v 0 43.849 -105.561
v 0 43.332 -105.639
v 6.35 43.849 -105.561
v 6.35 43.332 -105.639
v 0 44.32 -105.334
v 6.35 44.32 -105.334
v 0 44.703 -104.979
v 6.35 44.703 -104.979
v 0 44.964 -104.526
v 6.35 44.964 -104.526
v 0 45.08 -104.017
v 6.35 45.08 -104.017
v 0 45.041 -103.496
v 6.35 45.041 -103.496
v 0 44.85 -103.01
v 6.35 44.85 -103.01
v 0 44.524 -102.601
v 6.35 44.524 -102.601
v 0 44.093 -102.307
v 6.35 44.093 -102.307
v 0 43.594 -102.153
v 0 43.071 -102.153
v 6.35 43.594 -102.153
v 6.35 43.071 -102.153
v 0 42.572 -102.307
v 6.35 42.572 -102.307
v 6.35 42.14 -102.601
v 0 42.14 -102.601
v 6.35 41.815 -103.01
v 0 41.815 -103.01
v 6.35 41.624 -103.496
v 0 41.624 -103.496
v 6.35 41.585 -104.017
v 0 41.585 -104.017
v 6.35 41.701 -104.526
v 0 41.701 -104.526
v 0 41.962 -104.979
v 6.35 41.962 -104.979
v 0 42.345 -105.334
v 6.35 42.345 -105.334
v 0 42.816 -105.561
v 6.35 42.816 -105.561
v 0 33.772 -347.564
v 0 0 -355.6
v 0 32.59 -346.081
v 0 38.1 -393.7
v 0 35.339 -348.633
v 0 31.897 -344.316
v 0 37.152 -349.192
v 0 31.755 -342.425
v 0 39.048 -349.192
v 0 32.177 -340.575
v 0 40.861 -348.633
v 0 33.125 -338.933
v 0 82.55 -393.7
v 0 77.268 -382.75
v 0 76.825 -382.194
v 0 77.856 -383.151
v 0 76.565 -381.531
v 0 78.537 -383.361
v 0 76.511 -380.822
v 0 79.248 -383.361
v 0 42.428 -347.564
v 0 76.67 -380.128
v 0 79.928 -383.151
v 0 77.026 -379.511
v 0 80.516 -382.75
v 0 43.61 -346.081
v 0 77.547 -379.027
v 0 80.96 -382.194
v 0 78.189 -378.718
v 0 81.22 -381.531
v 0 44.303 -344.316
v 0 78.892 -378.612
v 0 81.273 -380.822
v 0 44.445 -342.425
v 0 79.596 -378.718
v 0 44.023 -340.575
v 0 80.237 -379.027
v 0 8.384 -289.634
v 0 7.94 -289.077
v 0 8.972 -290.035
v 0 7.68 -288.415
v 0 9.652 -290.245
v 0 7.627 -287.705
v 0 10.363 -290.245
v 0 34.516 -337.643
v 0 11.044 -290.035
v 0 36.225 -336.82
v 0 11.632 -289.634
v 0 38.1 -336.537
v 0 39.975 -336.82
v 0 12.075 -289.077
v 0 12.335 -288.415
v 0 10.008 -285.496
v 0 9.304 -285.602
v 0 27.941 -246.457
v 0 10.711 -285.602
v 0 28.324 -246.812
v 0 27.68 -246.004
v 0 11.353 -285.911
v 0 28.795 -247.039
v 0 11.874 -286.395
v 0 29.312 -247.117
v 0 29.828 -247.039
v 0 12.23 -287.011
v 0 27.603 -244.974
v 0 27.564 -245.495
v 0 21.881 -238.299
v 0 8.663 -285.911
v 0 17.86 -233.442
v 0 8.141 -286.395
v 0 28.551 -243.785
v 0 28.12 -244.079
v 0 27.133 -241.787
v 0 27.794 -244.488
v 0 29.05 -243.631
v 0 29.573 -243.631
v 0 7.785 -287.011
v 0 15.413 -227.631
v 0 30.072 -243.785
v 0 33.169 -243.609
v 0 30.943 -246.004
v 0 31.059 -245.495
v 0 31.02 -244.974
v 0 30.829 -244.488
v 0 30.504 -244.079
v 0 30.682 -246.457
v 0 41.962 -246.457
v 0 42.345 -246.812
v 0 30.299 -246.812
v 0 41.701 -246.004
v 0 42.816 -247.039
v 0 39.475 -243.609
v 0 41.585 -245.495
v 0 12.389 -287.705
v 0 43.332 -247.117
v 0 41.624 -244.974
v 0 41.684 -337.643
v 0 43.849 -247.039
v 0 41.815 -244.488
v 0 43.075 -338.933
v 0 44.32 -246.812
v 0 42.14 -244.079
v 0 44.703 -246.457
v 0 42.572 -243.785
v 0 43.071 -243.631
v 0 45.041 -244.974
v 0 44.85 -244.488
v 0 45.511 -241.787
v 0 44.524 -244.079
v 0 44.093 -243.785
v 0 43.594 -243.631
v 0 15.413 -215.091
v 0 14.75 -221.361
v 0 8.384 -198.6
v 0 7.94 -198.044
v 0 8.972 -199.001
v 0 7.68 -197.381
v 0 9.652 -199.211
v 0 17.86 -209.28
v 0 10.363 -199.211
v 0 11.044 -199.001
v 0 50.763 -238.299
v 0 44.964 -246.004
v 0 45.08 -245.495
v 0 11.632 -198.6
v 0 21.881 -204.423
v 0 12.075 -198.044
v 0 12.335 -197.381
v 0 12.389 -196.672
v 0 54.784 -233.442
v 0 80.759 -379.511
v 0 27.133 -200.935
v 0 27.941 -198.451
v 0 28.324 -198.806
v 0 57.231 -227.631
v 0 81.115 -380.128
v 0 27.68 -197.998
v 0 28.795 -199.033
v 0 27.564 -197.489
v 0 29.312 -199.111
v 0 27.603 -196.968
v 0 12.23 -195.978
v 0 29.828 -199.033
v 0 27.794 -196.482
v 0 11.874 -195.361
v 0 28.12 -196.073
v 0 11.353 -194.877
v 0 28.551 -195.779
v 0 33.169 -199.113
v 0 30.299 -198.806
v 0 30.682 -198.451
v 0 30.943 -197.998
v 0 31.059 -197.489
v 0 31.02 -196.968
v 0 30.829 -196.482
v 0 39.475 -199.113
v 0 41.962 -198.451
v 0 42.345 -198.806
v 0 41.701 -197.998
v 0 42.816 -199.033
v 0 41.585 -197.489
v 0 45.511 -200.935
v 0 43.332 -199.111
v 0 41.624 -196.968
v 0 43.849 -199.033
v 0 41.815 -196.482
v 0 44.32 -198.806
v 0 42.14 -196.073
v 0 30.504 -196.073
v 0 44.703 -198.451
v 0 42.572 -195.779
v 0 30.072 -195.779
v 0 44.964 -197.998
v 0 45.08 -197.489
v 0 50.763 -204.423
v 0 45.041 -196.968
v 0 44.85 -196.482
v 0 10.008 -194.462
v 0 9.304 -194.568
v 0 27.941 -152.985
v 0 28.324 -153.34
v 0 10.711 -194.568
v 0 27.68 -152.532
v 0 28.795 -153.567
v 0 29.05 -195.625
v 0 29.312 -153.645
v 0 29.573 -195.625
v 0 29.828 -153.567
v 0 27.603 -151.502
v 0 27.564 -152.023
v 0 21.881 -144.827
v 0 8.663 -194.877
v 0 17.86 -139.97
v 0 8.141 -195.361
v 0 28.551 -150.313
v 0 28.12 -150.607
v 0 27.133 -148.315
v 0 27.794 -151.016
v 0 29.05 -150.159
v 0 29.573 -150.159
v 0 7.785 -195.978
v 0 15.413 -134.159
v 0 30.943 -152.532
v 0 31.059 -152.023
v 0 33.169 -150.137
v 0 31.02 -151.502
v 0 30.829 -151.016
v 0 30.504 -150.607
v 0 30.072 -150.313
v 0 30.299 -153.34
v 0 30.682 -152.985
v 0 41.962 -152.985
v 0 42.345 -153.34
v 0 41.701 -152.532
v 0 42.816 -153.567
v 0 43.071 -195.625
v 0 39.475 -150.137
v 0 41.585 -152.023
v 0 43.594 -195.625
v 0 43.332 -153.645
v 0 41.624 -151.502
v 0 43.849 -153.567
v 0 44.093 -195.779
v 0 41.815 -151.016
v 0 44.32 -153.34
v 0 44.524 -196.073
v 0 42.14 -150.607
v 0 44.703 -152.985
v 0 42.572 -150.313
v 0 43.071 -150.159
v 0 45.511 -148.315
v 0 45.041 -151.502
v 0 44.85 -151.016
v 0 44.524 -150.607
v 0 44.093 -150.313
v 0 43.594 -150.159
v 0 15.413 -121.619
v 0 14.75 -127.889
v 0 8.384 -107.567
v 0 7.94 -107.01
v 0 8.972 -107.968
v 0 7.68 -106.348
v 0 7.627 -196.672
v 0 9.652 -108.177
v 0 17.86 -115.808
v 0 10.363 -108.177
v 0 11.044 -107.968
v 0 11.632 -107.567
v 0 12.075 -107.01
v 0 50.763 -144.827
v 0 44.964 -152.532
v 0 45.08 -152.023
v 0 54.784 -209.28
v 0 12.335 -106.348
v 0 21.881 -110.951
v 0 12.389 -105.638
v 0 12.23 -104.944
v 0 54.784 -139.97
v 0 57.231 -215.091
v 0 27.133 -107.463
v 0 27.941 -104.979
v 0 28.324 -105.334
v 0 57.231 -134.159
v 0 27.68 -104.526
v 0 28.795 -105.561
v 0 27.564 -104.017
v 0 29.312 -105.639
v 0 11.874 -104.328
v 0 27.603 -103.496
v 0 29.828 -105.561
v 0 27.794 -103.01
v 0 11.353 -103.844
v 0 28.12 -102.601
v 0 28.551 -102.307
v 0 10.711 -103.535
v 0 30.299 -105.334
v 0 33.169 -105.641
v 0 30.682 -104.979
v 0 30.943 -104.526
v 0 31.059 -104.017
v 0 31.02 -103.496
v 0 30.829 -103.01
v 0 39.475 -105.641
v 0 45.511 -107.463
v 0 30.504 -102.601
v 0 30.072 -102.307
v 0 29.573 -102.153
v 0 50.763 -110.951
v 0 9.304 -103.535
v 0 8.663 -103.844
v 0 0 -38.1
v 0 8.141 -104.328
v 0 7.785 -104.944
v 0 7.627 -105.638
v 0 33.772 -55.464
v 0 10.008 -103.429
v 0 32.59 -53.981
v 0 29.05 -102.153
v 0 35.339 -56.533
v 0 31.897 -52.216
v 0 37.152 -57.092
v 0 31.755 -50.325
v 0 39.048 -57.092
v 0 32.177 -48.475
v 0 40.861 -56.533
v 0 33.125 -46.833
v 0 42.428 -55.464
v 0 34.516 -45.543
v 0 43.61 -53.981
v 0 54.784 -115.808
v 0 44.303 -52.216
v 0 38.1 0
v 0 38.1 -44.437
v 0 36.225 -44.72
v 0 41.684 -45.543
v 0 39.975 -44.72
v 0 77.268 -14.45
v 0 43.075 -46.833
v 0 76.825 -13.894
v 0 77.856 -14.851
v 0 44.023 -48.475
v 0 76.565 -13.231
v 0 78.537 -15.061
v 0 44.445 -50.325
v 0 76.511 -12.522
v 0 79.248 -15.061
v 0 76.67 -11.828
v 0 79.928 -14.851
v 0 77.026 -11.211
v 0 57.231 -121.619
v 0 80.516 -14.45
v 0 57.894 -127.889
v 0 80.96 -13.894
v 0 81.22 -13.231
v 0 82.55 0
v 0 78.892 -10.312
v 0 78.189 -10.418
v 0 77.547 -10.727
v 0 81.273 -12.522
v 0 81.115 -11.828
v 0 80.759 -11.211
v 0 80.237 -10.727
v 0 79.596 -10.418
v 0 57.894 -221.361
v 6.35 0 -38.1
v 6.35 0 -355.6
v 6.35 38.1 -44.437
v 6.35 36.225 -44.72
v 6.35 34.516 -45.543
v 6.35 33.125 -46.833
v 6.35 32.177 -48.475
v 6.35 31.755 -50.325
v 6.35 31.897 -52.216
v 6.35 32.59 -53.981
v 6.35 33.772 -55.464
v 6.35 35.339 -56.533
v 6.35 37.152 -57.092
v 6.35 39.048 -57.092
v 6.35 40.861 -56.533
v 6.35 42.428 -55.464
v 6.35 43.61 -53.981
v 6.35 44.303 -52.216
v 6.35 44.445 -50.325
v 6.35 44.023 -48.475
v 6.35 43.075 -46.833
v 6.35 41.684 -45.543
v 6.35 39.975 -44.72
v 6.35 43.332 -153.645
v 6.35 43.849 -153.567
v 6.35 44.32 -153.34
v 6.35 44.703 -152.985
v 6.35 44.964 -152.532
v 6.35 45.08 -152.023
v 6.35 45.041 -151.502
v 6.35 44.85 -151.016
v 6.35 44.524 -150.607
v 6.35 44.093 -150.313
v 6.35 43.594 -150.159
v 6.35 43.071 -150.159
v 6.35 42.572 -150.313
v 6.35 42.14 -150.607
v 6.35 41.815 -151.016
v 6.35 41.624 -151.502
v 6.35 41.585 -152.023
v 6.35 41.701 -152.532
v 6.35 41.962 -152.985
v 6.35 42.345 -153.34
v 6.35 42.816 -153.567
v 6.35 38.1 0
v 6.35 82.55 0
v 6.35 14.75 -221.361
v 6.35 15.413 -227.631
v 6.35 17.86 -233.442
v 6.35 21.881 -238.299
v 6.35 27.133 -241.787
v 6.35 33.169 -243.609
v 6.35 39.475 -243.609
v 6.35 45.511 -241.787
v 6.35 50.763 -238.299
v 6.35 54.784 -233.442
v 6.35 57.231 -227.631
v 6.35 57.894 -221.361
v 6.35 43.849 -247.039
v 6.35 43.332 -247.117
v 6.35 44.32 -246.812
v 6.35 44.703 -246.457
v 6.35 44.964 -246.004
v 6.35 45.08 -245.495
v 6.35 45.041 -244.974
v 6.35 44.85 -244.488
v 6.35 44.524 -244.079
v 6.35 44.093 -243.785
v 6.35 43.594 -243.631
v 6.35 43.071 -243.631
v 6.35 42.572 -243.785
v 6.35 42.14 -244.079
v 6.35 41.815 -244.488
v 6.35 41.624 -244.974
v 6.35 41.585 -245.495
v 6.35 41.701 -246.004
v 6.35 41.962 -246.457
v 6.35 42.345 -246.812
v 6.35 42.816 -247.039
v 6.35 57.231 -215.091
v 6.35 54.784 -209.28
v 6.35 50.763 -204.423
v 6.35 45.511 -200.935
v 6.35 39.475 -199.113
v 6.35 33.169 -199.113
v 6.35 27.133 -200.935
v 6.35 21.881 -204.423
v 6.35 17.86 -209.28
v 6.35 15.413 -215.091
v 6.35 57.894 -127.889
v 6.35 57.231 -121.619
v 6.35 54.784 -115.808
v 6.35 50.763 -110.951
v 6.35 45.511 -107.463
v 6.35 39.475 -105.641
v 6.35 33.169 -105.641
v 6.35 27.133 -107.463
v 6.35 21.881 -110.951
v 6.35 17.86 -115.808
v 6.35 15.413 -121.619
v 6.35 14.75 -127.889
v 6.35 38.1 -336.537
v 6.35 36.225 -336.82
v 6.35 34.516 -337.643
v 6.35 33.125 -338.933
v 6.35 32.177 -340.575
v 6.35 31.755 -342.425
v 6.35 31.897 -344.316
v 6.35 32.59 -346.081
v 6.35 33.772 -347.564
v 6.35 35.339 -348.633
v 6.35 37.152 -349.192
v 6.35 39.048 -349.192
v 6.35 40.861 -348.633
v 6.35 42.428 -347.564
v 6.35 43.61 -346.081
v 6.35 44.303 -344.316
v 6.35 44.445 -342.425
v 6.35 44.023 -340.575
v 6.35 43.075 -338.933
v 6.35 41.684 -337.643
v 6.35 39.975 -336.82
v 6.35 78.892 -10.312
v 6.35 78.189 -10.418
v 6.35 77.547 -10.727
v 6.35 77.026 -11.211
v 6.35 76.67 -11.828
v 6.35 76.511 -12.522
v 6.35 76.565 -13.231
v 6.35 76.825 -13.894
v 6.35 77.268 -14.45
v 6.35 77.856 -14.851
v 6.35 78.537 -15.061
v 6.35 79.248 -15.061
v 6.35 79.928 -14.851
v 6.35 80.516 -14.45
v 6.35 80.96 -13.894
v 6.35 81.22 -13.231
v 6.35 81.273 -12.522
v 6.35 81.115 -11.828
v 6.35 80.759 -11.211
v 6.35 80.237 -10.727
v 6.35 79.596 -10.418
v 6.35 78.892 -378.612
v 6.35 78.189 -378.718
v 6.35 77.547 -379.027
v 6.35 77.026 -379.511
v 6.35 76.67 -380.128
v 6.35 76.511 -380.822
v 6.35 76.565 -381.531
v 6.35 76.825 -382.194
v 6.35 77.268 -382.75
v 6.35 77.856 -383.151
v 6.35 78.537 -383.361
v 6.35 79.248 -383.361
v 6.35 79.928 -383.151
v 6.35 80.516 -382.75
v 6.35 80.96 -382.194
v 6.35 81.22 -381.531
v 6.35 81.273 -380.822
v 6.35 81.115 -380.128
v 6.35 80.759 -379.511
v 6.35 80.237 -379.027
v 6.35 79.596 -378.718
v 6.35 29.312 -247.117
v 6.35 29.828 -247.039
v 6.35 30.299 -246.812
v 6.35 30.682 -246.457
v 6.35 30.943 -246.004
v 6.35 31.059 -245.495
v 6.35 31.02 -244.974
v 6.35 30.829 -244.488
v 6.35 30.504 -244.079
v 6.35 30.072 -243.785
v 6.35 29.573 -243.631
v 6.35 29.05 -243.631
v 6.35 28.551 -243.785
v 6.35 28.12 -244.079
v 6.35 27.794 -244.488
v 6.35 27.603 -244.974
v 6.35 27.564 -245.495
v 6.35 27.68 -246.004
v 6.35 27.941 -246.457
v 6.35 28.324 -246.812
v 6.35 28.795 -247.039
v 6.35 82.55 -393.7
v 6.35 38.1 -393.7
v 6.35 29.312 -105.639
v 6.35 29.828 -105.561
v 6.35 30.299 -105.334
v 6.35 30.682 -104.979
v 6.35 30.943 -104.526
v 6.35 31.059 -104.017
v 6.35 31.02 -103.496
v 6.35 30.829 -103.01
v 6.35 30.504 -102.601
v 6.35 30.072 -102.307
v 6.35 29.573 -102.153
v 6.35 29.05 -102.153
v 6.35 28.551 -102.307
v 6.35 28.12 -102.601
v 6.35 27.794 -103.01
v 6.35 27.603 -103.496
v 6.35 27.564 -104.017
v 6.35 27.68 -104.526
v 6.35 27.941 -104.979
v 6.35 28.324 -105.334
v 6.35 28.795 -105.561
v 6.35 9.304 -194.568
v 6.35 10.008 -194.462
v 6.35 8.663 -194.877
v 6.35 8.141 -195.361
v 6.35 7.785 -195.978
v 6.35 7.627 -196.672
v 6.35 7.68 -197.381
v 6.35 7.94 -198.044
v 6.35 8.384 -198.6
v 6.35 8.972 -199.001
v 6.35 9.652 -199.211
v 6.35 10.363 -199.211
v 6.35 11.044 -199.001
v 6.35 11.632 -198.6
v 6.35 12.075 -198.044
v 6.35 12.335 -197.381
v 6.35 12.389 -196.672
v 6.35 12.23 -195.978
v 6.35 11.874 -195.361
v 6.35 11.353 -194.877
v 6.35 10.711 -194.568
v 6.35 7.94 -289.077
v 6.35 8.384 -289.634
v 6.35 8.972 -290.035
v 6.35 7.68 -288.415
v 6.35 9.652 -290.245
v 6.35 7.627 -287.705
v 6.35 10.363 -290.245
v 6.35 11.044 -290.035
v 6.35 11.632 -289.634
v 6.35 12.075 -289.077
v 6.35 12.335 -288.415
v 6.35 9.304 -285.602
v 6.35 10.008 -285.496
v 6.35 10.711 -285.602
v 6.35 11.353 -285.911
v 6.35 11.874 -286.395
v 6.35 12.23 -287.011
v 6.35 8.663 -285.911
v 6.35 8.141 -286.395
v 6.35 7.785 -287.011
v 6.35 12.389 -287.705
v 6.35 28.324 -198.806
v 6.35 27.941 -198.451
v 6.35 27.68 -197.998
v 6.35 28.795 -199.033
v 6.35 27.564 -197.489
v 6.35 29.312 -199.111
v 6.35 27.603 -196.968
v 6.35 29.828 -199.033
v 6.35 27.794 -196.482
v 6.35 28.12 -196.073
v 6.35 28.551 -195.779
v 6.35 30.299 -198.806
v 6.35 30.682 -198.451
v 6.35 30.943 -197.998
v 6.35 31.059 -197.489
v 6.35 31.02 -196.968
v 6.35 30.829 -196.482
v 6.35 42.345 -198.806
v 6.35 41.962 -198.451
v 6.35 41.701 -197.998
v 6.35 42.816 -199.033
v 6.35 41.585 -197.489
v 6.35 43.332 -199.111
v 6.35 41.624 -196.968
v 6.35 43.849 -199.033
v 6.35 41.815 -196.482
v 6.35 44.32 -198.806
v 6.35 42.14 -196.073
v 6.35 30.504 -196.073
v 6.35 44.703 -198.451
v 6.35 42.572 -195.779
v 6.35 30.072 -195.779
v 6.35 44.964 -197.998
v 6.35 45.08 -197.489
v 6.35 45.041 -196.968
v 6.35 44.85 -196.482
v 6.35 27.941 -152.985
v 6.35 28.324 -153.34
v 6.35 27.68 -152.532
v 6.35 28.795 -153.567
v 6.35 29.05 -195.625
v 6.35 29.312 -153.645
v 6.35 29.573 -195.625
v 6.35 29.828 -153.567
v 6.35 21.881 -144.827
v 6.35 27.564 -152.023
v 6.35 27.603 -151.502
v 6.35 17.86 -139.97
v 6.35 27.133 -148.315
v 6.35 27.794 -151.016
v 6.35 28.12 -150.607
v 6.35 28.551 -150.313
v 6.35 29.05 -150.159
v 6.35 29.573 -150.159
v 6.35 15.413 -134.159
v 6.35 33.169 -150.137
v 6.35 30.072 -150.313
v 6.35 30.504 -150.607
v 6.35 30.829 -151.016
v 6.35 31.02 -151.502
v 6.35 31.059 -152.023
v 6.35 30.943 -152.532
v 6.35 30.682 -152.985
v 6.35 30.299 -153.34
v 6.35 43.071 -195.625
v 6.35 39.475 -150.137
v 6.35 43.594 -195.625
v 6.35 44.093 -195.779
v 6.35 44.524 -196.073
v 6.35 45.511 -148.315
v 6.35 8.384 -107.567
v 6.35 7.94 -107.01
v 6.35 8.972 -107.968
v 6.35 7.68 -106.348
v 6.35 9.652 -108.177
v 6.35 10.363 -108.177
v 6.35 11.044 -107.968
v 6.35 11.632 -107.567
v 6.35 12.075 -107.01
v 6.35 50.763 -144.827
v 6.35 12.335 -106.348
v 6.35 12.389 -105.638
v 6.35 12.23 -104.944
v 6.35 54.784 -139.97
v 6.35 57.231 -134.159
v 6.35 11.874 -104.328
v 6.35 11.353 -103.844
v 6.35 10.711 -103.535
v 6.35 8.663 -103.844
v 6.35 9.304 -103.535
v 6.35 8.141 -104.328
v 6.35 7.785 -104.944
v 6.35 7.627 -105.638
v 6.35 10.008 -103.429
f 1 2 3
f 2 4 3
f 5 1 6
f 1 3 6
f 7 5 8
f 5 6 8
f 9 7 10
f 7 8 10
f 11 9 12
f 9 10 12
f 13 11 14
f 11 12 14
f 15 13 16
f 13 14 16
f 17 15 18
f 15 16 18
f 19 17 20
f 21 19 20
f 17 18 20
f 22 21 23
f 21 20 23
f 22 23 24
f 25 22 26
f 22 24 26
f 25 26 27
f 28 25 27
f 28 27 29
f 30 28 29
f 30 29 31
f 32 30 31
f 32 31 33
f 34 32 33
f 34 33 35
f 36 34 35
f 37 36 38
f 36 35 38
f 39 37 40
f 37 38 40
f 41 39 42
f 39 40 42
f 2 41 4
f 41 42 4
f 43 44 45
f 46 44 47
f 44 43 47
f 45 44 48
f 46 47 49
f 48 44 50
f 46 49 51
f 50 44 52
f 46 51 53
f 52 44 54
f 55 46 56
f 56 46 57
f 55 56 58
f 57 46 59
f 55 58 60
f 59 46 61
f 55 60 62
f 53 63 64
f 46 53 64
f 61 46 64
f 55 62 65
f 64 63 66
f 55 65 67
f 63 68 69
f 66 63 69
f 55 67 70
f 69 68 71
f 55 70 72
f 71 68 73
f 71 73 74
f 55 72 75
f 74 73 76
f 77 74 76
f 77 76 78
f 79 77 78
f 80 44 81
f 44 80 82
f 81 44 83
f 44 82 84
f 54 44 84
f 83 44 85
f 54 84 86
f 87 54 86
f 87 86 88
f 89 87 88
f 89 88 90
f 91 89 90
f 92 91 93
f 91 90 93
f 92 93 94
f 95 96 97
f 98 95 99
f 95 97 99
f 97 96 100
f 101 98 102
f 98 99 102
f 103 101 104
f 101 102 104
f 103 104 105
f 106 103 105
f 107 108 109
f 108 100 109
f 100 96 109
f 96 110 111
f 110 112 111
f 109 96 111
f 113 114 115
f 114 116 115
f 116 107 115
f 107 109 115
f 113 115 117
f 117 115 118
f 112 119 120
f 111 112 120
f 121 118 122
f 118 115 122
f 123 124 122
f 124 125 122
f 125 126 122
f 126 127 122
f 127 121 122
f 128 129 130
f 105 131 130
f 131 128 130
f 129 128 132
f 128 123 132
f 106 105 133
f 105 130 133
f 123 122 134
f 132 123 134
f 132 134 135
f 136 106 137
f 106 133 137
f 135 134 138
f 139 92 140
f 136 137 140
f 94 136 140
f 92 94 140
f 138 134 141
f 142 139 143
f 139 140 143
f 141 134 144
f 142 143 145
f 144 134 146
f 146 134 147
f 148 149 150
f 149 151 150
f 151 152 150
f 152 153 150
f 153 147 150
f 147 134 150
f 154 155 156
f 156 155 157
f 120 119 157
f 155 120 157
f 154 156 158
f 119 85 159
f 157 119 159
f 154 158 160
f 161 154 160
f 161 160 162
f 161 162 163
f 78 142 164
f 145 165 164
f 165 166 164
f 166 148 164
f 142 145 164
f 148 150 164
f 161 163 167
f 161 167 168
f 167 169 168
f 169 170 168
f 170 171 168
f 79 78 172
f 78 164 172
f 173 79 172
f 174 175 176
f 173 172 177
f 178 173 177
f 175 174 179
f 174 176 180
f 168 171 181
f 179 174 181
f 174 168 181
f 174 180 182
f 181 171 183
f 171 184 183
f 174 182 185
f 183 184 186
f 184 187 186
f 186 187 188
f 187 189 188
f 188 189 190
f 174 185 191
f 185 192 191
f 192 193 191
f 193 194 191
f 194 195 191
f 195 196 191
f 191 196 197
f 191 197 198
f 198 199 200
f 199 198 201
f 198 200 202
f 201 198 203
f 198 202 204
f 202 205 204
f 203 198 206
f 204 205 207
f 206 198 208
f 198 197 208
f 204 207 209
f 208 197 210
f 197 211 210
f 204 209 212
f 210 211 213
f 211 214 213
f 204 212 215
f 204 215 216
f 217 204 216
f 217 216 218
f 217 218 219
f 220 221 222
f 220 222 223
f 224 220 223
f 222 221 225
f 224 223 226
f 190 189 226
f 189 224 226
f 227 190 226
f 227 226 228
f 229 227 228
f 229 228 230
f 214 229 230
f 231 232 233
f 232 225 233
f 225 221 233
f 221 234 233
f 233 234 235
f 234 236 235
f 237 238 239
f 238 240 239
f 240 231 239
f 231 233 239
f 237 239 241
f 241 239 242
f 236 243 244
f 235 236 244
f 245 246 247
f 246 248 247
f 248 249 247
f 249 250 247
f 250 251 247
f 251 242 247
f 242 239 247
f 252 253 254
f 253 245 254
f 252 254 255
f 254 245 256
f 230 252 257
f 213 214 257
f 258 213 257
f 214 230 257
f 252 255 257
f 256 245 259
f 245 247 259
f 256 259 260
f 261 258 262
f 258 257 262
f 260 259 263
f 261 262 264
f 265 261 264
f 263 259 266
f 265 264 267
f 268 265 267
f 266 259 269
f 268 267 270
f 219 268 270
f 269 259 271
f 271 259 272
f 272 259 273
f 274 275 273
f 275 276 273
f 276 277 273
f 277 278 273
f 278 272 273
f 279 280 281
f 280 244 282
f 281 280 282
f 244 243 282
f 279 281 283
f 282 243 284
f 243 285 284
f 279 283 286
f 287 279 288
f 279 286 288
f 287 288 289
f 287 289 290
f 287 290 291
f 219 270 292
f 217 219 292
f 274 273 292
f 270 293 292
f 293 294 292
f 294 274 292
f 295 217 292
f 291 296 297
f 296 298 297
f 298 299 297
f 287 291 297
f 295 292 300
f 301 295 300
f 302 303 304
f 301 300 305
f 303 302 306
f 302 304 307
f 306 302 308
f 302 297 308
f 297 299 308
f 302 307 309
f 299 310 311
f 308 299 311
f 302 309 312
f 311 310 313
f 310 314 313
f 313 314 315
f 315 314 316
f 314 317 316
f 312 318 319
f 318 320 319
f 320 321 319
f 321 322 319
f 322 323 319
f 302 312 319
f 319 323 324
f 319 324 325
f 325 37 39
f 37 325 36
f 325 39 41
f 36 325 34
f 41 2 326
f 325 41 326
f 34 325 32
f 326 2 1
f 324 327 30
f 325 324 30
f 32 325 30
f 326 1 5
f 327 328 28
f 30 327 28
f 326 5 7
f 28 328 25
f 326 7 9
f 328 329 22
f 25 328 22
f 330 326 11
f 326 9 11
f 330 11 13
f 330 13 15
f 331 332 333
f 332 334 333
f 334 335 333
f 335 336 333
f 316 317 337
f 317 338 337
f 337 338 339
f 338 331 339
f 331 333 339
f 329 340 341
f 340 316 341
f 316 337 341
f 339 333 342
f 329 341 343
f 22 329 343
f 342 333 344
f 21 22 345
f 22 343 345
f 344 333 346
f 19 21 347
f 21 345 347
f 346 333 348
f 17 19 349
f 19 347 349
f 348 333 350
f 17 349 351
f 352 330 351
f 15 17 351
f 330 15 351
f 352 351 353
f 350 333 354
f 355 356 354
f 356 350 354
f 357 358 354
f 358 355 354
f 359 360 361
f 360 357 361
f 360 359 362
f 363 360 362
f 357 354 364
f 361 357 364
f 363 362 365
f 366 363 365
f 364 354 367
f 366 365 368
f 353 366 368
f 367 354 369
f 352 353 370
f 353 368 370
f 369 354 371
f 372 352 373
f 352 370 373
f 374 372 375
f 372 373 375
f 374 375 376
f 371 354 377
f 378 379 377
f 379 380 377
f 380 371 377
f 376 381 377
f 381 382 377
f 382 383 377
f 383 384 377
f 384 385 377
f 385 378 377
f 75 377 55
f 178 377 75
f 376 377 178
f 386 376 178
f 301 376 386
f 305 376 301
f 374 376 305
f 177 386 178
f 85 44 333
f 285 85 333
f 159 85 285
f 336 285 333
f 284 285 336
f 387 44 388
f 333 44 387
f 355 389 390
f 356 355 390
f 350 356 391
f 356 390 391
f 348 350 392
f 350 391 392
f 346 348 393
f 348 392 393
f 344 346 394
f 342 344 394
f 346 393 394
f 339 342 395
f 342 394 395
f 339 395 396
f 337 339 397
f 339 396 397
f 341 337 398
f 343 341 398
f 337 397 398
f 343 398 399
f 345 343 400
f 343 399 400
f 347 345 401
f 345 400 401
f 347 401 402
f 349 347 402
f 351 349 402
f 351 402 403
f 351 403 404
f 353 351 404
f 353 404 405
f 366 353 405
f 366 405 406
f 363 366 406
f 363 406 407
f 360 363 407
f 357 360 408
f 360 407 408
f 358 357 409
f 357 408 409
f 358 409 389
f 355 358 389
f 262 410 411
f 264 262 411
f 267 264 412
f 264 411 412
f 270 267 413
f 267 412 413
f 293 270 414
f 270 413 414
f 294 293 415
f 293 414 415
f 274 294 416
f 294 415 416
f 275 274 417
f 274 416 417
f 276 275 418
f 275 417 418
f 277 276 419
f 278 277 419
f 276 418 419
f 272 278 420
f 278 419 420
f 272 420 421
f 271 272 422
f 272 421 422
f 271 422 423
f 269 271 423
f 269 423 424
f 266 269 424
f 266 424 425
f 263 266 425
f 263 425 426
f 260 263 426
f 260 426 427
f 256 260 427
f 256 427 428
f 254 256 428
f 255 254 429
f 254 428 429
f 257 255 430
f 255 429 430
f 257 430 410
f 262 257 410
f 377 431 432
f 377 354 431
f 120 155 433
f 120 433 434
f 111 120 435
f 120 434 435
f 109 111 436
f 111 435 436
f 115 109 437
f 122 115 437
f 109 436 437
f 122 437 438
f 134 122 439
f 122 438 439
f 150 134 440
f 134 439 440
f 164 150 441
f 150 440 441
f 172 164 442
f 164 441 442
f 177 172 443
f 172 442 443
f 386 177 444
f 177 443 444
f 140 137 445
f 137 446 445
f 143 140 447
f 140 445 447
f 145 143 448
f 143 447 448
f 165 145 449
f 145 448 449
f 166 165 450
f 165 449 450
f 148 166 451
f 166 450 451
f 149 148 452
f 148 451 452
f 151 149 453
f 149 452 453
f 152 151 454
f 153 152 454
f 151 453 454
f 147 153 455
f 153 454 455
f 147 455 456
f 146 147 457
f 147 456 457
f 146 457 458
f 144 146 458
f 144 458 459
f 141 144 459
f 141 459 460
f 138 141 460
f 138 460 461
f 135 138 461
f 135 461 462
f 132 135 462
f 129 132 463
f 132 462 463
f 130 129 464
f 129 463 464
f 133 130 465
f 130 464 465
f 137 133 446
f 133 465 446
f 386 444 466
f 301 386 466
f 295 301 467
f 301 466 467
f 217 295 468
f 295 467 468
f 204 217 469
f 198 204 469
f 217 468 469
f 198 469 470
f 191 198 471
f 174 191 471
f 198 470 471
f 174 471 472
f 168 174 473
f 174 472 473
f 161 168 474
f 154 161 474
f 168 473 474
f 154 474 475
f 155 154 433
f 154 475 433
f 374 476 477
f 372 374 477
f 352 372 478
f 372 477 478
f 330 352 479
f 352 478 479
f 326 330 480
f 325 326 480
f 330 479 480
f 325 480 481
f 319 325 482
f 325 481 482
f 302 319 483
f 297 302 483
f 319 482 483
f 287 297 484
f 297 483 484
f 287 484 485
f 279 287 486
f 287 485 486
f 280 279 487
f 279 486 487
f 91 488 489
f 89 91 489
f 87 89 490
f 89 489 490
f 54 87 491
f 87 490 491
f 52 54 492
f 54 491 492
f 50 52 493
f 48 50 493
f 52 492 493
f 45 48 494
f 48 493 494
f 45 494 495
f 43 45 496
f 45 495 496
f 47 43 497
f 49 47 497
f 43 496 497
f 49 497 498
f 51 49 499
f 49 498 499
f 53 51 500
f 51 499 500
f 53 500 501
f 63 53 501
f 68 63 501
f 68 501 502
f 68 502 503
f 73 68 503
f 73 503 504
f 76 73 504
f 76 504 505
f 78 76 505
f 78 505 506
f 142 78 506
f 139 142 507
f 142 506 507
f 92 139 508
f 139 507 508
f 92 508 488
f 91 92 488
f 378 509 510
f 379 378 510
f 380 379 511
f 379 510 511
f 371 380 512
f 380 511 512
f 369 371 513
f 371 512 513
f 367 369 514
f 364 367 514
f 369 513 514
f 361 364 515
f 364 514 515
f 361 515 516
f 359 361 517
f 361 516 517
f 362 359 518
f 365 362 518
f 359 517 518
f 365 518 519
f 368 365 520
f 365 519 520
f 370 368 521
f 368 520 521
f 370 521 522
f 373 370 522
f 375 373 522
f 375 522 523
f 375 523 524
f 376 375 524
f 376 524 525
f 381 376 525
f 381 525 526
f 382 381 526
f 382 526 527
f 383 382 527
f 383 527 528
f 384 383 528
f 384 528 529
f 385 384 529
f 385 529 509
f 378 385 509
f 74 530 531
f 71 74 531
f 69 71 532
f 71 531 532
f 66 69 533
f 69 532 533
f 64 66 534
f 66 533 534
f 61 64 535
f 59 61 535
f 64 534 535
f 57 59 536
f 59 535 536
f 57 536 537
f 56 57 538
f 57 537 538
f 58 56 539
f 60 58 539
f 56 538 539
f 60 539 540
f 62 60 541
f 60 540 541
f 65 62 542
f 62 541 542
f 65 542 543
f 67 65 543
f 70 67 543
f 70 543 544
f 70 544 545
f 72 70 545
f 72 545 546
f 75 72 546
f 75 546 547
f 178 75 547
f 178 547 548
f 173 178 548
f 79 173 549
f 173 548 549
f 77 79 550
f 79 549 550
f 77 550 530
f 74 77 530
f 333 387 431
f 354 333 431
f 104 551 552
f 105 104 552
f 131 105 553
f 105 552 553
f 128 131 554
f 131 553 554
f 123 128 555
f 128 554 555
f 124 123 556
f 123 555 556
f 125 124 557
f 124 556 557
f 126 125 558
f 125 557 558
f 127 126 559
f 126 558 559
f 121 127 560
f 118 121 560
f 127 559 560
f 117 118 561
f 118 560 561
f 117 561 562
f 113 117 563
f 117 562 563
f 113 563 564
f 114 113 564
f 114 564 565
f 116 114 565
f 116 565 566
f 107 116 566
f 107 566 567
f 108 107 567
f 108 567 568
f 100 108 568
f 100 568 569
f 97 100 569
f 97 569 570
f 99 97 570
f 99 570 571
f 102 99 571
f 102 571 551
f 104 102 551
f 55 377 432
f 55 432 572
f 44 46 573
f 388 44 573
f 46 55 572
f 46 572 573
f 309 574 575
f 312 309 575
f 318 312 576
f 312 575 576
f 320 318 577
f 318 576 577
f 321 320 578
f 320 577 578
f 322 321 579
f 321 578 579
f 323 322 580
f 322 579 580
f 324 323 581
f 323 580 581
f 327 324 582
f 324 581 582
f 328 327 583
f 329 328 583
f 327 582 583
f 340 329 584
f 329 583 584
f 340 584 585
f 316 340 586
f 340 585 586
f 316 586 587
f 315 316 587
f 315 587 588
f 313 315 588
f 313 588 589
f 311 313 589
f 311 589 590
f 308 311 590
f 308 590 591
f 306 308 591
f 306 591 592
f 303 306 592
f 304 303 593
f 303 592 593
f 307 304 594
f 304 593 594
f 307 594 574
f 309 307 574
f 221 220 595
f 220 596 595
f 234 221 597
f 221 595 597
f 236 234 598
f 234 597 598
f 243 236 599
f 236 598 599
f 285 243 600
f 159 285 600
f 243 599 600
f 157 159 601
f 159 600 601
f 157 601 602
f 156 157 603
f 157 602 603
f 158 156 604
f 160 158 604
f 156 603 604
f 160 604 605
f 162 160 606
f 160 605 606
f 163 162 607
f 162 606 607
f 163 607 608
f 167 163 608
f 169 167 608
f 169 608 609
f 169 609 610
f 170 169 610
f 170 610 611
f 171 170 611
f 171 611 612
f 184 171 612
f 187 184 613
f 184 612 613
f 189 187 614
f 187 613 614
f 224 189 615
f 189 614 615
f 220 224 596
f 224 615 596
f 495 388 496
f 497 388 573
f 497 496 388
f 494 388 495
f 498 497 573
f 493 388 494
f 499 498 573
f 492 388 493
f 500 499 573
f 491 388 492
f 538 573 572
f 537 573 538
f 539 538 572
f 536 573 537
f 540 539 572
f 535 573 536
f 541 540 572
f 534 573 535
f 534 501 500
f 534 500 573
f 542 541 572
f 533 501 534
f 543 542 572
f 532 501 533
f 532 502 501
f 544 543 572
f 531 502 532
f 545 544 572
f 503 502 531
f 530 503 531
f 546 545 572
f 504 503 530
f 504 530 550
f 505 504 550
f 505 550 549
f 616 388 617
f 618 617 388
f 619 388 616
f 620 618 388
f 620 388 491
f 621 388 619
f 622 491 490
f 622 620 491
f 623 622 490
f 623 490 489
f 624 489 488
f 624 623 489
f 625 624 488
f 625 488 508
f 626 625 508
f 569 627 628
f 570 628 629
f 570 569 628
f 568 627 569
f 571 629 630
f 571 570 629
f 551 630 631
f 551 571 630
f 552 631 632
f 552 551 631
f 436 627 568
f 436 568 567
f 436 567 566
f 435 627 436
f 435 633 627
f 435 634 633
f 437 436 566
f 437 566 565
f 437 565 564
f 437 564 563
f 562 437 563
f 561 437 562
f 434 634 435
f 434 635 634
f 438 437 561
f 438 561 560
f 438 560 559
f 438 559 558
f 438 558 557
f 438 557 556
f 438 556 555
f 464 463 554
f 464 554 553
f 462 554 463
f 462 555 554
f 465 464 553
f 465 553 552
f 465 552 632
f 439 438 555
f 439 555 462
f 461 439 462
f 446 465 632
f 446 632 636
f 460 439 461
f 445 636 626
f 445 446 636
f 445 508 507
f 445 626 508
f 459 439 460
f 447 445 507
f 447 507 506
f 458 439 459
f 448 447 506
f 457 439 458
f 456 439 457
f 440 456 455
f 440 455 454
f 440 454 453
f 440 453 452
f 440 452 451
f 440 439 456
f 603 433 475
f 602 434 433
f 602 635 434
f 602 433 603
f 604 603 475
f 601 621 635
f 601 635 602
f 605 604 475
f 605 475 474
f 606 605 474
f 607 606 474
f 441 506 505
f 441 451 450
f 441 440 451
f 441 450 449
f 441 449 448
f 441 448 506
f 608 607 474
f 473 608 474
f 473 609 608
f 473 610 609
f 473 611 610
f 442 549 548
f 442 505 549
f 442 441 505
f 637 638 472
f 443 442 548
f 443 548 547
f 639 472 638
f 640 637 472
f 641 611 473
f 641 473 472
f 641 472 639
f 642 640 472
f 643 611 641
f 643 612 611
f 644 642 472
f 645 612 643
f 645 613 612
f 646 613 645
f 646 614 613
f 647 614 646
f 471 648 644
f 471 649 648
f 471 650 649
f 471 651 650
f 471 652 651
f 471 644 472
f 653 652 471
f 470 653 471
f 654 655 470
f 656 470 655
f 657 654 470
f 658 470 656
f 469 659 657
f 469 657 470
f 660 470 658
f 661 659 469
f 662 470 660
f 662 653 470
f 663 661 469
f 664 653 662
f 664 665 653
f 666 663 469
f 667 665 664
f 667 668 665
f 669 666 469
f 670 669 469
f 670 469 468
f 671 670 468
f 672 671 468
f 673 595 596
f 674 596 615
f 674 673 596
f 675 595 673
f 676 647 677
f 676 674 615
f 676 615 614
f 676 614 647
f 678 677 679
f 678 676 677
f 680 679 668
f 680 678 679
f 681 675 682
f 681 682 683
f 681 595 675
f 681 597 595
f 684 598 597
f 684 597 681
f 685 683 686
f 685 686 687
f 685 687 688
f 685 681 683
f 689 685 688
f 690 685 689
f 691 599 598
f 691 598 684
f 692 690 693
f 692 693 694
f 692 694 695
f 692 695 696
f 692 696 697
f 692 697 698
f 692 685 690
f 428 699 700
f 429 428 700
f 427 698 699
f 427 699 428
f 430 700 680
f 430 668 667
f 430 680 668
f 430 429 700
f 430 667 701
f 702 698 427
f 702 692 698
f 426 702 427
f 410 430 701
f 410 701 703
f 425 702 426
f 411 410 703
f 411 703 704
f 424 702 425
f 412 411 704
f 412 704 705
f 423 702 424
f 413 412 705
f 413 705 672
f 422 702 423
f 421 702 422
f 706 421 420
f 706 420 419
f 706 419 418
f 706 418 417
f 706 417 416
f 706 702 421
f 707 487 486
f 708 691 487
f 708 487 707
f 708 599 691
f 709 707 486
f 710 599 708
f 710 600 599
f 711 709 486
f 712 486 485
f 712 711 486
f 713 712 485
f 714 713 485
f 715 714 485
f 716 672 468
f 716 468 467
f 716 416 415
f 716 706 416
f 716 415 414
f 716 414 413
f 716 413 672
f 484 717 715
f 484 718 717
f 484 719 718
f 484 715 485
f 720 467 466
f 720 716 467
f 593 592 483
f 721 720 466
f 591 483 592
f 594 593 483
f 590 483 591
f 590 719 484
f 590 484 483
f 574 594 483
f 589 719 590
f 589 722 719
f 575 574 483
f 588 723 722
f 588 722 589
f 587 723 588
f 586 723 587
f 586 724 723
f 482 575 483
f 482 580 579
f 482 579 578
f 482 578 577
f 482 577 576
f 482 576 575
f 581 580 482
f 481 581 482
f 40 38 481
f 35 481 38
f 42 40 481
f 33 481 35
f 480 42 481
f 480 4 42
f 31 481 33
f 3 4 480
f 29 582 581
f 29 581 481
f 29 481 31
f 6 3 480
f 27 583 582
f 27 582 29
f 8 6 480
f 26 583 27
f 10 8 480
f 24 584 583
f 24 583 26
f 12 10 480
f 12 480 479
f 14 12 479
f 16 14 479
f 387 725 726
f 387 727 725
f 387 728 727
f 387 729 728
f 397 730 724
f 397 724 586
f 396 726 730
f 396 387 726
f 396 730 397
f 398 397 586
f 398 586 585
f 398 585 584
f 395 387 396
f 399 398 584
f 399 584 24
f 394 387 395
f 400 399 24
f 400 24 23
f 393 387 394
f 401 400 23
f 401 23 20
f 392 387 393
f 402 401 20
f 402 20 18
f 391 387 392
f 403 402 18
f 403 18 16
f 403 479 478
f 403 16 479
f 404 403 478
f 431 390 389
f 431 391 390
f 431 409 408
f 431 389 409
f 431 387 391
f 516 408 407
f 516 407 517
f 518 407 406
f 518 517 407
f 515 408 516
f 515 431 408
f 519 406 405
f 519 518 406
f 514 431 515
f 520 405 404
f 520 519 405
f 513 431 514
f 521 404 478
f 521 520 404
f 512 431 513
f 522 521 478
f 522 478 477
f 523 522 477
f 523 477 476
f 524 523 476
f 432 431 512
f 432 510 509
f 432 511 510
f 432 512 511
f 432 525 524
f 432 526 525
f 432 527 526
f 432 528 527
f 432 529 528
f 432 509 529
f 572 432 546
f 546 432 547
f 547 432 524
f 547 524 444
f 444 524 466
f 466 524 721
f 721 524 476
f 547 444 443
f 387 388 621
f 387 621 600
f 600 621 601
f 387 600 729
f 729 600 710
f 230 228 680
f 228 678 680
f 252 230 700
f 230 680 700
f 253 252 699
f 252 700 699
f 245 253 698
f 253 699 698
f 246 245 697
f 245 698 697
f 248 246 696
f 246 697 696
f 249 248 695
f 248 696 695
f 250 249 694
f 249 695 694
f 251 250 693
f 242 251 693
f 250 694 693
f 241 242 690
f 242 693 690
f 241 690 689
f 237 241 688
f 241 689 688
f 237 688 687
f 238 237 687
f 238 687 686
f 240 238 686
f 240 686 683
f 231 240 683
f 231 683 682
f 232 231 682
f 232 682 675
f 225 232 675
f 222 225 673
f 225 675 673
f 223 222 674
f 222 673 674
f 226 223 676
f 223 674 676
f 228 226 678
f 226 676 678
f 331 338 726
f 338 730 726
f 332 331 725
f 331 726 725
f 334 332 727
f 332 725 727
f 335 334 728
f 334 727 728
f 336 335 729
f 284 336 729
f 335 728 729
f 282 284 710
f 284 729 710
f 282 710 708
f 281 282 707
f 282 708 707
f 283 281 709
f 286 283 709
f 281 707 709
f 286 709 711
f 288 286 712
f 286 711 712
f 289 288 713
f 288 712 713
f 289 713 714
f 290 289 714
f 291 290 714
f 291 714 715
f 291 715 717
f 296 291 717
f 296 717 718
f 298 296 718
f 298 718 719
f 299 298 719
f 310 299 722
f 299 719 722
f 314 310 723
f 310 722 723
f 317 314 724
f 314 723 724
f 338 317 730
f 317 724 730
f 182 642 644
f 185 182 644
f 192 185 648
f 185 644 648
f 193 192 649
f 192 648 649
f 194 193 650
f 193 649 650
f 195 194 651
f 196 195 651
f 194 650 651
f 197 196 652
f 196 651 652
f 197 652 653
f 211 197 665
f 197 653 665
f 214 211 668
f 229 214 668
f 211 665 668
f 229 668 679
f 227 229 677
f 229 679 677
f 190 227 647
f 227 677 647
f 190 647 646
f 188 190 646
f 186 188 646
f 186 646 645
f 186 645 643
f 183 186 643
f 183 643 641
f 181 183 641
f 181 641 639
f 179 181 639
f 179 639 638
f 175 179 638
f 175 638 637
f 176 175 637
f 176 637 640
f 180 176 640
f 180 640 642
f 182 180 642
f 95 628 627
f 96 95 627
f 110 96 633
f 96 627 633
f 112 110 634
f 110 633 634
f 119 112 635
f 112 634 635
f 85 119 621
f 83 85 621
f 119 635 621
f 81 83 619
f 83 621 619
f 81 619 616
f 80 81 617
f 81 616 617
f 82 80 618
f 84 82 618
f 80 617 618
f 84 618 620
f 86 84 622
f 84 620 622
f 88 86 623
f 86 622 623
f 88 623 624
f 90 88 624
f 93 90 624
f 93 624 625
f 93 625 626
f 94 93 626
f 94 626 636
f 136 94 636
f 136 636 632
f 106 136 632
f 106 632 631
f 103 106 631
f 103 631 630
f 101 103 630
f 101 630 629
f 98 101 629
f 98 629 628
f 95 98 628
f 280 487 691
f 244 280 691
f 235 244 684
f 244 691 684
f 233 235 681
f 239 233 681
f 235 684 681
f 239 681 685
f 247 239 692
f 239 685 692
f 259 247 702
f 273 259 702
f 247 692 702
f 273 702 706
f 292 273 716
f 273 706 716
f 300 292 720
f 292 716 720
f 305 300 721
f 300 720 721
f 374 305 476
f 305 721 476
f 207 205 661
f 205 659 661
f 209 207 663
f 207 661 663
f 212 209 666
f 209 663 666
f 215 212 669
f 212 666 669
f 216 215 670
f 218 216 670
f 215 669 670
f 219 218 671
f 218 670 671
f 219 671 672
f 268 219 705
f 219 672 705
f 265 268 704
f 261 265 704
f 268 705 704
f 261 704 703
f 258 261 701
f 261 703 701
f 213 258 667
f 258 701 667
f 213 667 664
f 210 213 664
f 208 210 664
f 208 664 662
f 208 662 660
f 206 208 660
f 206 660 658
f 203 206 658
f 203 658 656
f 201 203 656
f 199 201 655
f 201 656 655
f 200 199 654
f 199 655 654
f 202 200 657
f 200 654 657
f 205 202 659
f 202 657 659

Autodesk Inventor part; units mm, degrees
ref_plane "YZ Plane" through (0, 0, 0) normal (1, 0, 0) x (0, 1, 0)
ref_plane "XZ Plane" through (0, 0, 0) normal (0, 1, 0) x (-1, 0, 0)
ref_plane "XY Plane" through (0, 0, 0) normal (0, 0, 1) x (1, 0, 0)
sketch "Sketch1" plane through (0, 0, 0) normal (1, 0, 0) x (0, 1, 0)
  line L0 (444.5, 0) -> (444.5, -2.1042)
  line L1 (0, -2.1042) -> (0, 0)
  line L2 (0, -74.1174) -> (0, -66.8433)
  line L3 (0, 0) -> (82.55, 0)
  line L4 (82.55, 0) -> (82.55, -393.7)
  line L5 (82.55, -393.7) -> (0, -393.7)
  line L6 (0, -393.7) -> (0, 0)
  point P0 (25.4, -50.8)
  point P1 (25.4, -342.9)
  dimension "d2" = 82.55
  dimension "d3" = 393.7
  dimension "d4" = 50.8
  dimension "d5" = 25.4
  dimension "d6" = 50.8
  dimension "d7" = 25.4
extrude "Extrusion1" add sketch "Sketch1" along normal blind 6.35
sketch "Sketch3" plane through (6.35, 0, 0) normal (1, 0, 0) x (0, 0, -1)
  point P0 (0, 0)
sketch "Sketch4" plane through (6.35, 0, 0) normal (1, 0, 0) x (0, 0, -1)
  point P0 (0, 0)
chamfer "Chamfer1" distance 38.1 angle 45 1 edges at (3.175, 0, 0)
chamfer "Chamfer2" distance 38.1 angle 45 1 edges at (3.175, 0, -393.7)
sketch "Sketch5" plane through (0, 0, 0) normal (-1, 0, 0) x (0, 0, 1)
  line L0 (0, 82.55) -> (-393.7, 82.55) projected
  line L1 (-355.6, 0) -> (-393.7, 38.1) projected
  line L2 (-355.6, 0) -> (-38.1, 0) projected
  line L3 (0, 38.1) -> (-38.1, 0) projected
  line L4 (0, 38.1) -> (0, 82.55) projected
  line L5 (0, 82.55) -> (-393.7, 82.55) projected
  line L6 (-393.7, 82.55) -> (-393.7, 38.1) projected
  point P0 (0, 0)
  point P1 (-342.9, 38.1)
  point P2 (-50.8, 38.1)
  dimension "d16" = 50.8
  dimension "d17" = 38.1
  dimension "d18" = 38.1
  dimension "d19" = 50.8
hole "Hole1" at (0, 38.1, -342.9) at (0, 38.1, -50.8) direction (1, 0, 0) diameter 12.7254 end through all
sketch "Sketch7" plane through (0, 0, 0) normal (-1, 0, 0) x (0, 0, 1)
  line L0 (-38.1, 0) -> (-355.6, 0) projected
  line L1 (-393.7, 82.55) -> (-393.7, 38.1) projected
  line L2 (0, 38.1) -> (0, 82.55) projected
  line L3 (0, 82.55) -> (-393.7, 82.55) projected
  point P0 (0, 0)
  point P1 (-298.45, 10.0076)
  point P2 (-95.25, 10.0076)
  point P3 (-12.7, 78.8924)
  point P4 (-381, 78.8924)
  dimension "d42" = 10.0076
  dimension "d43" = 95.25
  dimension "d44" = 95.25
  dimension "d45" = 3.6576
  dimension "d46" = 12.7
  dimension "d47" = 12.7
  dimension "d82" = 3.6576
hole "Hole3" at (0, 78.8924, -381) at (0, 78.8924, -12.7) direction (1, 0, 0) diameter 4.7752 end through all
sketch "Sketch8" plane through (0, 0, 0) normal (-1, 0, 0) x (0, 0, 1)
  line L0 (0, 38.1) -> (0, 82.55) projected
  line L1 (0, 82.55) -> (-393.7, 82.55) projected
  line L2 (-355.6, 0) -> (-38.1, 0) projected
  point P0 (0, 0)
  point P1 (-196.85, 78.8924)
  point P2 (-196.85, 10.0076)
  dimension "d55" = 196.85
  dimension "d56" = 3.6576
  dimension "d57" = 10.0076
sketch "Sketch9" plane through (0, 0, 0) normal (-1, 0, 0) x (0, 0, 1)
  line L0 (-355.6, 0) -> (-38.1, 0) projected
  line L1 (-393.7, 82.55) -> (-393.7, 38.1) projected
  line L2 (0, 38.1) -> (0, 82.55) projected
  point P0 (0, 0)
  point P1 (-287.8836, 10.0076)
  point P2 (-105.8164, 10.0076)
  dimension "d58" = 10.0076
  dimension "d59" = 105.8164
  dimension "d60" = 105.8164
hole "Hole4" at (0, 10.0076, -196.85) direction (1, 0, 0) diameter 4.7752 end through all
hole "Hole5" at (0, 10.0076, -105.8164) at (0, 10.0076, -287.8836) direction (1, 0, 0) diameter 4.7752 end through all
sketch "Sketch10" plane through (0, 0, 0) normal (-1, 0, 0) x (0, 0, 1)
  circle A0 centre (-222.25, 36.322) radius 1.778
  circle A1 centre (-127, 36.322) radius 1.778
  line L0 (-393.7, 82.55) -> (0, 82.55) projected
  line L1 (-114.3619, 67.6125) -> (-112.4836, 67.6125)
  point P0 (0, 0)
  point P1 (-220.472, 36.322)
  point P2 (-128.778, 36.322)
  dimension "d108" = 46.228
  dimension "d109" = 46.228
hole "Hole6" at (0, 36.322, -127) at (0, 36.322, -220.472) at (0, 36.322, -128.778) at (0, 36.322, -222.25) direction (1, 0, 0) diameter 43.18 end through all
sketch "Sketch14" plane through (6.35, 0, 0) normal (1, 0, 0) x (0, 0, -1)
  arc A0 (127.889, 57.8937) -> (127.889, 14.7503) centre (127, 36.322) ccw projected
  arc A1 (127.889, 14.7503) -> (127.889, 57.8937) centre (128.778, 36.322) ccw projected
  arc A2 (221.361, 57.8937) -> (221.361, 14.7503) centre (220.472, 36.322) ccw projected
  arc A3 (221.361, 14.7503) -> (221.361, 57.8937) centre (222.25, 36.322) ccw projected
  line L0 (127.889, 57.8937) -> (127.889, 14.7503)
  line L1 (96.03, 36.322) -> (156.5626, 36.322)
  line L2 (221.361, 57.8937) -> (221.361, 14.7503)
  line L3 (190.5646, 36.322) -> (248.6345, 36.322)
  line L4 (127.889, 36.322) -> (103.886, 36.322)
  line L5 (103.886, 36.322) -> (103.886, 43.3324)
  line L6 (103.886, 43.3324) -> (103.886, 36.322)
  line L7 (103.886, 36.322) -> (103.886, 29.3116)
  line L8 (127.889, 36.322) -> (151.892, 36.322)
  line L9 (151.892, 36.322) -> (151.892, 29.3116)
  line L10 (151.892, 36.322) -> (151.892, 43.3324)
  line L11 (221.361, 43.3324) -> (197.358, 43.3324)
  line L12 (221.361, 43.3324) -> (245.364, 43.3324)
  line L13 (221.361, 29.3116) -> (197.358, 29.3116)
  line L14 (221.361, 29.3116) -> (245.364, 29.3116)
  circle A4 centre (103.886, 29.3116) radius 1.7526
  circle A5 centre (103.886, 43.3324) radius 1.7526
  circle A6 centre (151.892, 43.3324) radius 1.7526
  circle A7 centre (151.892, 29.3116) radius 1.7526
  circle A8 centre (197.358, 43.3324) radius 1.7526
  circle A9 centre (197.358, 29.3116) radius 1.7526
  circle A10 centre (245.364, 29.3116) radius 1.7526
  circle A11 centre (245.364, 43.3324) radius 1.7526
  point P0 (0, 0)
  dimension "d113" = 24.003
  dimension "d114" = 7.0104
  dimension "d115" = 7.0104
  dimension "d116" = 24.003
  dimension "d117" = 24.003
  dimension "d118" = 24.003
  dimension "d119" = 3.5052
  dimension "d120" = 3.5052
  dimension "d121" = 3.5052
  dimension "d122" = 3.5052
  dimension "d123" = 3.5052
extrude "Extrusion2" cut sketch "Sketch14" against normal blind 25.4 contours A6 | A7 | A4 | A5 | A11 | A10 | A9 | A8
properties part number "DriveTrainPlate"
